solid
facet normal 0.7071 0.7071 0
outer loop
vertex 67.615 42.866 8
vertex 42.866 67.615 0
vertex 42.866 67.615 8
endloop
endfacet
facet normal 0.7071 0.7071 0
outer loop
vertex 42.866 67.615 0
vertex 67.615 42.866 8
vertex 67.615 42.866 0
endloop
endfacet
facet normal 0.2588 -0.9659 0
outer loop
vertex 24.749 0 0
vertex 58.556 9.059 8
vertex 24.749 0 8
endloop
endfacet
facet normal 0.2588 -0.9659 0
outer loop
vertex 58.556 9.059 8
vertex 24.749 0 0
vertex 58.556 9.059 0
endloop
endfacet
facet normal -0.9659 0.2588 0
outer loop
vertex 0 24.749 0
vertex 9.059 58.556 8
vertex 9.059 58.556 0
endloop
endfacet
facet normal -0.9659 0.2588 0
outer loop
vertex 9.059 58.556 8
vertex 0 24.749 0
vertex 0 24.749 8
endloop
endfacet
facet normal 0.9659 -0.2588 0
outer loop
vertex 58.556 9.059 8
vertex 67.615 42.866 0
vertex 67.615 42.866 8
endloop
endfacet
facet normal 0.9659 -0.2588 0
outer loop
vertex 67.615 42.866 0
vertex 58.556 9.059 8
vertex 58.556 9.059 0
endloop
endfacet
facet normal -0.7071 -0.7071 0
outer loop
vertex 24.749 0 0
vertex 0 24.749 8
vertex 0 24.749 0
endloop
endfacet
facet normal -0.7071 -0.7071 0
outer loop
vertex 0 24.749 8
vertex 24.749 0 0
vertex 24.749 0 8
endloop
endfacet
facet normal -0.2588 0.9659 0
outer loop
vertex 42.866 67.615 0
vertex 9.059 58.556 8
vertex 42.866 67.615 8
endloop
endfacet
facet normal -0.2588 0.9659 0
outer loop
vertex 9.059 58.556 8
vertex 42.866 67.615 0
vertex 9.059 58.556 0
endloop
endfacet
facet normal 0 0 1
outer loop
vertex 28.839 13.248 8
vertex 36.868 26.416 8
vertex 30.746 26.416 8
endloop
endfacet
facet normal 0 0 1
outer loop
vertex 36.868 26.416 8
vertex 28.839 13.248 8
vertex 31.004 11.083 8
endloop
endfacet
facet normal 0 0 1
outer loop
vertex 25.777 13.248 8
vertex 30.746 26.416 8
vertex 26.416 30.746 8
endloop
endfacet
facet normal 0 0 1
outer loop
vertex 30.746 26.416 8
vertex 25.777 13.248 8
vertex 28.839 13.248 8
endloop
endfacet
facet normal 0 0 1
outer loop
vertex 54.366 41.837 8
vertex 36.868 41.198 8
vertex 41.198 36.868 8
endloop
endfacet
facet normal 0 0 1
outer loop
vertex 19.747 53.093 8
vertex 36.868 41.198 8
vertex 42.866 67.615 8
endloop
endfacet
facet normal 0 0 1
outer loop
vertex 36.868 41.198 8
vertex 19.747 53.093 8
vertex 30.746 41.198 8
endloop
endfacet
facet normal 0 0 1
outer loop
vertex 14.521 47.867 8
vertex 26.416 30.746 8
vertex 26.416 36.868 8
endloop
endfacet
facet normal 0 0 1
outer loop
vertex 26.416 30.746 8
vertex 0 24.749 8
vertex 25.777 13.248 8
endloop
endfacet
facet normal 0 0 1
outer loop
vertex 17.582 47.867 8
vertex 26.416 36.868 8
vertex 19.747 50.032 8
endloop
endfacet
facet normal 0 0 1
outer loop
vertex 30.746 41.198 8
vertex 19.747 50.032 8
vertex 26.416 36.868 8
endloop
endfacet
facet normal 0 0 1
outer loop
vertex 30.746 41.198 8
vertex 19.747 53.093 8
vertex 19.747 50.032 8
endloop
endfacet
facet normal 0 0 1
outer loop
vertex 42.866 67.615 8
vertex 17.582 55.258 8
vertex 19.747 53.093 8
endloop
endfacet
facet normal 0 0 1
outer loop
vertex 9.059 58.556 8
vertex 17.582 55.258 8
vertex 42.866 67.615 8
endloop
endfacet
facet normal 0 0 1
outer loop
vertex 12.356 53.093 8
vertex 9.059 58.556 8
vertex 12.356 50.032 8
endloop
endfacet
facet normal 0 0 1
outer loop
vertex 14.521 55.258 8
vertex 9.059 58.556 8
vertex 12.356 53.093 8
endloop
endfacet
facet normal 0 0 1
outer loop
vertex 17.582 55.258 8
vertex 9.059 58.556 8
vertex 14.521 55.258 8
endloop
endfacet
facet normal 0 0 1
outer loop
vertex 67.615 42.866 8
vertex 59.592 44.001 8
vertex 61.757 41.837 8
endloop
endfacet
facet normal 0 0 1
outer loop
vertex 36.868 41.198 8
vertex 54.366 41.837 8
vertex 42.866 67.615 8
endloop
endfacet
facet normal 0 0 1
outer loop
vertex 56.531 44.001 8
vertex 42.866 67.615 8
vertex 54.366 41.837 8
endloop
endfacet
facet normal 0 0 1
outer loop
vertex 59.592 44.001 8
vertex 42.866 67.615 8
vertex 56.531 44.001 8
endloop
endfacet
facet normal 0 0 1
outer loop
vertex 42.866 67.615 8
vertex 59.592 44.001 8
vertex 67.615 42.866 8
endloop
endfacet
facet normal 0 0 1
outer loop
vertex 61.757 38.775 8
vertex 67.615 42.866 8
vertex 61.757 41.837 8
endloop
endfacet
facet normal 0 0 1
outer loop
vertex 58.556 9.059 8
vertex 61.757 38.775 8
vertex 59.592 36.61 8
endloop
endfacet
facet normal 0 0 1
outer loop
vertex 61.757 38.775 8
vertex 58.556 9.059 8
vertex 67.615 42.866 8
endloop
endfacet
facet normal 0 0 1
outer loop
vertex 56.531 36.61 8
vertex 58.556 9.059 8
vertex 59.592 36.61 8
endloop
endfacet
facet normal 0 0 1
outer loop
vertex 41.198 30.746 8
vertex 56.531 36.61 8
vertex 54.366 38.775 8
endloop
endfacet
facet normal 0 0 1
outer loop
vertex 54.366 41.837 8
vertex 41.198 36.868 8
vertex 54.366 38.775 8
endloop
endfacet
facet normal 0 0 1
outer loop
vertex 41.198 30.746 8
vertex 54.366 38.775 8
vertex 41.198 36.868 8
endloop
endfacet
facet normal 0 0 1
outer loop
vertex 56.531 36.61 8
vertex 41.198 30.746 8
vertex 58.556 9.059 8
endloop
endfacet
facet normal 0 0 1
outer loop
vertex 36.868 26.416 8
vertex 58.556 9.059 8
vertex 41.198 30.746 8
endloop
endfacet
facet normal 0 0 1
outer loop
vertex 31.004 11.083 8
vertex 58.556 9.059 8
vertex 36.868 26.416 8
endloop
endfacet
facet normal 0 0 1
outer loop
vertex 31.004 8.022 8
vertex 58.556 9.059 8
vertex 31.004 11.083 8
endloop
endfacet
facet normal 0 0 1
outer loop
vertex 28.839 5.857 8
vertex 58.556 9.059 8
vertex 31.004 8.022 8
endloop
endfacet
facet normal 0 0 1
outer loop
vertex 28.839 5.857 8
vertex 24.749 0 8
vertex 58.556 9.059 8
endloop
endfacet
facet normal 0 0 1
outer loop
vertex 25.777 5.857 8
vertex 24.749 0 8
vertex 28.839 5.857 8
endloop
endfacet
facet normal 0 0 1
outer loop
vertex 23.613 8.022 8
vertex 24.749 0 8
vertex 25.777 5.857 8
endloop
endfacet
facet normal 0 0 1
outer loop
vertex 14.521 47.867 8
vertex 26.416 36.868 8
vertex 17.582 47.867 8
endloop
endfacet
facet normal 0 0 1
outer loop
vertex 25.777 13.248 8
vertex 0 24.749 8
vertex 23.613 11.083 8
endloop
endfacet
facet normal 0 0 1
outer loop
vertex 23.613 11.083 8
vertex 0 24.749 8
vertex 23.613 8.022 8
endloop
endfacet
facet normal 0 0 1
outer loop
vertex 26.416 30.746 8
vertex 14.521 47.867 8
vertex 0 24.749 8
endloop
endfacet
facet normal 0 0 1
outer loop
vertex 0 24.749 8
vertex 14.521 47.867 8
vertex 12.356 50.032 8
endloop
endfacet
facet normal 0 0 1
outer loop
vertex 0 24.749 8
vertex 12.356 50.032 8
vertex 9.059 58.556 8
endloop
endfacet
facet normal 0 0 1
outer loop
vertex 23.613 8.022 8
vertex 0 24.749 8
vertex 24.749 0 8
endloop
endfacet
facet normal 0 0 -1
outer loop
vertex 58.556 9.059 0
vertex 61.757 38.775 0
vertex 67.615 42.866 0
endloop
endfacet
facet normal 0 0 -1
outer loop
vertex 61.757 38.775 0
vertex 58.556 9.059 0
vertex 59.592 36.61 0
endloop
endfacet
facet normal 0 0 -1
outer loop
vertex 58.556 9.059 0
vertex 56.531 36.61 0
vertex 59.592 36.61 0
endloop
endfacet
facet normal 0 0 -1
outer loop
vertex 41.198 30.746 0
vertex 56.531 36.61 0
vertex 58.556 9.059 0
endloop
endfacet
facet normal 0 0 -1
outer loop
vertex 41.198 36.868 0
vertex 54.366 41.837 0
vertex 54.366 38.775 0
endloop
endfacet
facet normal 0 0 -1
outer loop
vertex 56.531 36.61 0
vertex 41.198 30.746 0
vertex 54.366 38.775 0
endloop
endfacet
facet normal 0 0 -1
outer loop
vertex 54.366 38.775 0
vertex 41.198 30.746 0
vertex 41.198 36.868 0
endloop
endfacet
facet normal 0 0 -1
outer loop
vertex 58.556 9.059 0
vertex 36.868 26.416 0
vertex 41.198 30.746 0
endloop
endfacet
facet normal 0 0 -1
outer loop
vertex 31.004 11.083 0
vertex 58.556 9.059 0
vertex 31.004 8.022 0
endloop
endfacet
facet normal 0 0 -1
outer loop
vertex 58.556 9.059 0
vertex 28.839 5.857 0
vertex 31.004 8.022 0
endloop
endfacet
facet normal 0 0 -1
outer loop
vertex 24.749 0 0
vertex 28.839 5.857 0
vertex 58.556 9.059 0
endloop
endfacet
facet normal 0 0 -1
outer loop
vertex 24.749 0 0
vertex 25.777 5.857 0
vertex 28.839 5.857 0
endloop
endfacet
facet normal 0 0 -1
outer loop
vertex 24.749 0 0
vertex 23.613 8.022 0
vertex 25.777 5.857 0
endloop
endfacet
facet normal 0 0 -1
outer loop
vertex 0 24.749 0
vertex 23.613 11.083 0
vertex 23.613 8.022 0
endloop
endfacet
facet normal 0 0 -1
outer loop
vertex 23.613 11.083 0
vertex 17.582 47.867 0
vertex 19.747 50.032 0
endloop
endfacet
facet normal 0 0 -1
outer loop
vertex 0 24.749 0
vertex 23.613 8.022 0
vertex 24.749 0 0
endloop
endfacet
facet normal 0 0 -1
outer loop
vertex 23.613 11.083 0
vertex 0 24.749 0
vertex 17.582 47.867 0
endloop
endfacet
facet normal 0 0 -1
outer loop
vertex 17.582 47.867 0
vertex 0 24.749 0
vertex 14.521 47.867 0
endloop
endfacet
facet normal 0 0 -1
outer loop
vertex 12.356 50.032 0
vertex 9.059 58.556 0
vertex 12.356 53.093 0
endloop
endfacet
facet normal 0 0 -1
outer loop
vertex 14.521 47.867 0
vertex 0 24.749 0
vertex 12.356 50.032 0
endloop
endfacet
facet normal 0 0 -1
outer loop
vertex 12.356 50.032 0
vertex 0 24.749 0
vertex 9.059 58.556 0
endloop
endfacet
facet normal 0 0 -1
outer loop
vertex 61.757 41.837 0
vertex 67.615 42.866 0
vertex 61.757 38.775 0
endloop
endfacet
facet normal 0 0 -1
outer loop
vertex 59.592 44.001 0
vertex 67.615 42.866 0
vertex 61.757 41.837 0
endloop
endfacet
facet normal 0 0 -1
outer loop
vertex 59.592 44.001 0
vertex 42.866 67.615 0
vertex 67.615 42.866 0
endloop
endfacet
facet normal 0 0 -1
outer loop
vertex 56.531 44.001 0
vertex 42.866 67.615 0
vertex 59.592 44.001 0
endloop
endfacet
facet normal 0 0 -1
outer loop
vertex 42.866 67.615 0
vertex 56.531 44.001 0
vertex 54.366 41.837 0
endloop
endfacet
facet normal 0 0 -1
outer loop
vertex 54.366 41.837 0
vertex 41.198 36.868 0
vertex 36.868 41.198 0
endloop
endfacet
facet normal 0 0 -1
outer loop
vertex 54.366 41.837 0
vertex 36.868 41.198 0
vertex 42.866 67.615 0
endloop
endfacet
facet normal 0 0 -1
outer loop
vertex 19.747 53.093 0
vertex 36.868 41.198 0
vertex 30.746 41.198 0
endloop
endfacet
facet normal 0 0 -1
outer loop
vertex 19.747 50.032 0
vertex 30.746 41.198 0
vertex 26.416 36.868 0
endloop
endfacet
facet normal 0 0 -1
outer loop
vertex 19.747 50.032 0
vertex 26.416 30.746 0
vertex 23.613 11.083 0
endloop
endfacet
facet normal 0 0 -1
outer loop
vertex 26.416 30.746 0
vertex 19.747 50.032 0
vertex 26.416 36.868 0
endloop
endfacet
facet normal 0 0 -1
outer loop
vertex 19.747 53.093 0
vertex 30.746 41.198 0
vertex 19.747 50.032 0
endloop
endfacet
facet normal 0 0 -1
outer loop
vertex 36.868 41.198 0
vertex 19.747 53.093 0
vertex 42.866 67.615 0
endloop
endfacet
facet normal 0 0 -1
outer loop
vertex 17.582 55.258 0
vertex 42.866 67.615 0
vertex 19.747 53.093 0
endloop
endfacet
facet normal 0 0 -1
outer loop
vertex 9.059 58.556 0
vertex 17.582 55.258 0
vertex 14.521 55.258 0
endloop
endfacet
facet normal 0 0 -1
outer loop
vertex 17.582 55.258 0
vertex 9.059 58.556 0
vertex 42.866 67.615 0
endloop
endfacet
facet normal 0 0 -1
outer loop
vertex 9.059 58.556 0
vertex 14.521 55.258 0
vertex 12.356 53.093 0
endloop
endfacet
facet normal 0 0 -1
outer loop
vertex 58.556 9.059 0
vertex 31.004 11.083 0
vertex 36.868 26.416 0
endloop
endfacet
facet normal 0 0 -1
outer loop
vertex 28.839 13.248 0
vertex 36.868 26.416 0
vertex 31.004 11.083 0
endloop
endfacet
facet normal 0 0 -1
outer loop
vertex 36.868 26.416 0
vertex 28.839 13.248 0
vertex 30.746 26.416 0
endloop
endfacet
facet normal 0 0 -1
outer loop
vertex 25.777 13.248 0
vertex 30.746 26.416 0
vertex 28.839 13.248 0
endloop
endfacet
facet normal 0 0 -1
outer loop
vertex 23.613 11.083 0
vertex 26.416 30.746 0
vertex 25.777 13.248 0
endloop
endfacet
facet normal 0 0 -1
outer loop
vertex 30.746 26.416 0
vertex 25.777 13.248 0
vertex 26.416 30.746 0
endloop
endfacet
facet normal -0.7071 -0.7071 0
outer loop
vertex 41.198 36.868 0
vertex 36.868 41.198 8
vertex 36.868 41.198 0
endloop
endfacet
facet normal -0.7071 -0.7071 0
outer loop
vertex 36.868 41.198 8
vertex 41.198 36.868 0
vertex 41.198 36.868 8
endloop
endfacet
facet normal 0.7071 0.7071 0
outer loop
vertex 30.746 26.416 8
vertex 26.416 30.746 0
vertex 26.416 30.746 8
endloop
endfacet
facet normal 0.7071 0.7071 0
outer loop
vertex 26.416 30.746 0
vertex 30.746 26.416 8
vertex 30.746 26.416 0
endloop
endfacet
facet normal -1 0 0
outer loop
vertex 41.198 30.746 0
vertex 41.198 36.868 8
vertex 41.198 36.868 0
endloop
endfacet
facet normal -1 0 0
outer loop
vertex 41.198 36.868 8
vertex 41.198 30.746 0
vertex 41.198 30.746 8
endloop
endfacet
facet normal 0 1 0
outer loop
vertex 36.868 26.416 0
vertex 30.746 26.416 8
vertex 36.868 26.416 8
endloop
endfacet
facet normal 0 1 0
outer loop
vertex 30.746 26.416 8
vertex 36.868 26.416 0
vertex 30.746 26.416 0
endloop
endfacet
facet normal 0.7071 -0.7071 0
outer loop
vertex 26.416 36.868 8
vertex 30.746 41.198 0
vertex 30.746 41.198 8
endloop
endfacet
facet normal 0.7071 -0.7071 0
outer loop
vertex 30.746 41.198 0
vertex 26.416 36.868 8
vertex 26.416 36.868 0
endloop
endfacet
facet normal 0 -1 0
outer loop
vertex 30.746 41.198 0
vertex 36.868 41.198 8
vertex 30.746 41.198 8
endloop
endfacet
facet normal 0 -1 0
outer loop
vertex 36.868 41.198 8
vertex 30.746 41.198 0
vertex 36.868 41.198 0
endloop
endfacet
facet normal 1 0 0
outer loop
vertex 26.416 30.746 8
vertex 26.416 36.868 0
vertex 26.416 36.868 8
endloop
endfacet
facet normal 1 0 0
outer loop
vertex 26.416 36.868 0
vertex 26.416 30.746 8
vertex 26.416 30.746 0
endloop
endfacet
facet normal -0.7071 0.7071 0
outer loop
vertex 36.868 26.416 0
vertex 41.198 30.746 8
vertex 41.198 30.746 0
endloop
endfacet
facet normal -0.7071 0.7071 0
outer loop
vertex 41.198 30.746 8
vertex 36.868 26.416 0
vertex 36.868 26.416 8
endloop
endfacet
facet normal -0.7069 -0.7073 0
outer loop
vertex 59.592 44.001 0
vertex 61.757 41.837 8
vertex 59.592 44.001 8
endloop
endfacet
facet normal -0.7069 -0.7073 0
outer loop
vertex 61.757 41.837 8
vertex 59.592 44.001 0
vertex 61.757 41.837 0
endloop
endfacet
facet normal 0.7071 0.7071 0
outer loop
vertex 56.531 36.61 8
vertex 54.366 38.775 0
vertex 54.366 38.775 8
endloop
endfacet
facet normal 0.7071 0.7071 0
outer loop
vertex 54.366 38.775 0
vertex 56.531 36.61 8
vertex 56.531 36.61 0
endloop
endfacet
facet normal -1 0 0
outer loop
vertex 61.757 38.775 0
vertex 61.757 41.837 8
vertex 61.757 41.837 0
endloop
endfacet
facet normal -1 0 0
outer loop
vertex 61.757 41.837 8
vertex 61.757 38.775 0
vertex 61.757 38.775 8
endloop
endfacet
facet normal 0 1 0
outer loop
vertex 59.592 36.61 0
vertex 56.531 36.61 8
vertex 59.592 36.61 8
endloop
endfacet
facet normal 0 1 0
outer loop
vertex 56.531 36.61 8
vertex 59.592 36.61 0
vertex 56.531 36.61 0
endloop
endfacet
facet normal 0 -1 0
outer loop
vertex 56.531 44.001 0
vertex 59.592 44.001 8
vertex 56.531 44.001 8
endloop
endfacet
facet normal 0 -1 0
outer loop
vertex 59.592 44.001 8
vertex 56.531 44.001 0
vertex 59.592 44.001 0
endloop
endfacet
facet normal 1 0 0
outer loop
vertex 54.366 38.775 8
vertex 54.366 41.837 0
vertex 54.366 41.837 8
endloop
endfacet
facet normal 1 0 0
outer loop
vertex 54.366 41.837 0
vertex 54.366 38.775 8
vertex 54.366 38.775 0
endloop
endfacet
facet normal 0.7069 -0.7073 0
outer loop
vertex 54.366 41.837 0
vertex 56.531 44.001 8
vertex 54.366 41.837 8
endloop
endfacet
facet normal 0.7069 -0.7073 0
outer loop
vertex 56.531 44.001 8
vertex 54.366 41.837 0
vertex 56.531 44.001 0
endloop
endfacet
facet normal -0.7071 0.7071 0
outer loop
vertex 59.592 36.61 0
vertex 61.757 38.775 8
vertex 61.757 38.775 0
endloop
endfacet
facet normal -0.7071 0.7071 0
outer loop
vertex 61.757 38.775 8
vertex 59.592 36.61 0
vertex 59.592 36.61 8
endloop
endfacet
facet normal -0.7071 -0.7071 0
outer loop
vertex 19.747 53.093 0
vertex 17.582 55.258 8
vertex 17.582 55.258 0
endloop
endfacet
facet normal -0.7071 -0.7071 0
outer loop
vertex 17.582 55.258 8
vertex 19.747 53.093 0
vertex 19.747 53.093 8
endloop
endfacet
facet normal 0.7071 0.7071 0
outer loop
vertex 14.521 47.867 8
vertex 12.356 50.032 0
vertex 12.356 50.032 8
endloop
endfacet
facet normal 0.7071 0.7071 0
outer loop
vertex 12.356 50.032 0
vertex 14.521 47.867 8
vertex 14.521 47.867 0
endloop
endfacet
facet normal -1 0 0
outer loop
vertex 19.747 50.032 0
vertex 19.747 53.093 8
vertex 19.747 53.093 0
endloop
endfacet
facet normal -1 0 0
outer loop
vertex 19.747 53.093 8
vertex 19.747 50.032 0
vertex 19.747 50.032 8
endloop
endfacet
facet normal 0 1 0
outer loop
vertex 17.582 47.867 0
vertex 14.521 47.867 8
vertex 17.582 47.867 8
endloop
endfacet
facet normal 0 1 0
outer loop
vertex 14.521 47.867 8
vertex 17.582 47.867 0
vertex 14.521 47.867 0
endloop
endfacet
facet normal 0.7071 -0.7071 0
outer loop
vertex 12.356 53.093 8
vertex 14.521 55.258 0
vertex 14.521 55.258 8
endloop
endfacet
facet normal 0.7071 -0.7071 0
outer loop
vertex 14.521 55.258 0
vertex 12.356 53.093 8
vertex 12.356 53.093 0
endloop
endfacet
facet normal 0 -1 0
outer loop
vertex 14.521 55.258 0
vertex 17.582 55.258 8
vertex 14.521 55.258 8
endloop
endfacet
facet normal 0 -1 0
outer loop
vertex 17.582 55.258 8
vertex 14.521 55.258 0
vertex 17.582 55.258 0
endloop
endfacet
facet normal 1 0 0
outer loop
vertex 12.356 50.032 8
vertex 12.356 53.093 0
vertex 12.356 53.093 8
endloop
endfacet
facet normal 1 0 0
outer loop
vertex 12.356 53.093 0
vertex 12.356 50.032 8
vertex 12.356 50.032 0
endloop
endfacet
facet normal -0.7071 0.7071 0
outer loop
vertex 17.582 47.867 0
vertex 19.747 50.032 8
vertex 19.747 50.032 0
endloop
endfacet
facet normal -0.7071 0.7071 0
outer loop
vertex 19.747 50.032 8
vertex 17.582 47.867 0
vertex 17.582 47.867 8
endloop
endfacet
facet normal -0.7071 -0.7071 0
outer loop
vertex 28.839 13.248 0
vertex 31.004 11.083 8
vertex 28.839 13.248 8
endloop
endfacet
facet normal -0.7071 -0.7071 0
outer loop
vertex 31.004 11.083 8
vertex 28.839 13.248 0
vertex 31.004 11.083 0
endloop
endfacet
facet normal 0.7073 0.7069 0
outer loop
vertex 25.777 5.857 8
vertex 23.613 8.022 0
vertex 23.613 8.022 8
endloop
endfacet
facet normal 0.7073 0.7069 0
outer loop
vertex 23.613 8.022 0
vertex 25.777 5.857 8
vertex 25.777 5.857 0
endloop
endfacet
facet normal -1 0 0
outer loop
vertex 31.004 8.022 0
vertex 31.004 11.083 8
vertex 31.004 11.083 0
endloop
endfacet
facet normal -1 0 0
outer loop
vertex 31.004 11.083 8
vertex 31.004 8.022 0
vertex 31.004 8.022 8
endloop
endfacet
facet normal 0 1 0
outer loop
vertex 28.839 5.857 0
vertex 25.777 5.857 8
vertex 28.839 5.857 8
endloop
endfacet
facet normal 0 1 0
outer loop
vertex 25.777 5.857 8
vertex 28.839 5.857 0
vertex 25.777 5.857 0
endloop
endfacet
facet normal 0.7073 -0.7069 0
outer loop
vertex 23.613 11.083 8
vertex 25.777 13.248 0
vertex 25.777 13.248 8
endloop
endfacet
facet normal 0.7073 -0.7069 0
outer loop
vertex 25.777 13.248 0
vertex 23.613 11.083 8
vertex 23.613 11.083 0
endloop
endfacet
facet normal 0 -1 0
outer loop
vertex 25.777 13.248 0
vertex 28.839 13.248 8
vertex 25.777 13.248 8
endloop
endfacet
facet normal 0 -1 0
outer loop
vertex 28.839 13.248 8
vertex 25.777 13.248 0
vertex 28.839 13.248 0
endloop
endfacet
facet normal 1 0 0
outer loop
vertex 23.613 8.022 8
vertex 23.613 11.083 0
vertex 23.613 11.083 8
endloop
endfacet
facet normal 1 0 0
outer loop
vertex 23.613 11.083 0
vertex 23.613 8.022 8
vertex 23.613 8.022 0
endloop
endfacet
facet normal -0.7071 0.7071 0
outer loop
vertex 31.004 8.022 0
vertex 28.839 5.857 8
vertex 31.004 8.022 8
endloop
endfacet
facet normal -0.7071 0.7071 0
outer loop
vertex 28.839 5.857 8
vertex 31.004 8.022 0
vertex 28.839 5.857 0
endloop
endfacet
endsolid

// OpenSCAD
$fn = 32;

// ----------------------------------------------------------------------
// Polygon plate: 6-gon R35, 3 bolt windows
// ----------------------------------------------------------------------

// --- parameters (mm) ---
sides = 6;                // number of polygon sides
plate_r = 35;             // circumscribed radius of the polygon
bore_r = 8;               // centre bore radius
bolts = 3;                // number of bolt windows
ring_r = 25.11;           // bolt-circle radius
bolt_r = 4;               // bolt window radius
plate_t = 8;              // plate thickness, Z (extrusion height)

plate_d = 2 * plate_r;  // circumscribed diameter
bore_d = 2 * bore_r;  // centre bore diameter
bolt_d = 2 * bolt_r;  // bolt window diameter
ring_d = 2 * ring_r;  // bolt-circle diameter

profile = [[67.615, 42.866], [42.866, 67.615], [9.059, 58.556], [0, 24.749], [24.749, 0], [58.556, 9.059]];  // primary outline, 6 points, counter clockwise
void_1 = [[41.198, 36.868], [36.868, 41.198], [30.746, 41.198], [26.416, 36.868], [26.416, 30.746], [30.746, 26.416], [36.868, 26.416], [41.198, 30.746]];  // centre bore, 8 points
void_2 = [[61.757, 41.837], [59.592, 44.001], [56.531, 44.001], [54.366, 41.837], [54.366, 38.775], [56.531, 36.61], [59.592, 36.61], [61.757, 38.775]];  // bolt window 1, 8 points
void_3 = [[19.747, 53.093], [17.582, 55.258], [14.521, 55.258], [12.356, 53.093], [12.356, 50.032], [14.521, 47.867], [17.582, 47.867], [19.747, 50.032]];  // bolt window 2, 8 points
void_4 = [[31.004, 11.083], [28.839, 13.248], [25.777, 13.248], [23.613, 11.083], [23.613, 8.022], [25.777, 5.857], [28.839, 5.857], [31.004, 8.022]];  // bolt window 3, 8 points

// --- the one profile operation ---
difference() {
  linear_extrude(height = plate_t) polygon(points = profile);
  translate([0, 0, -1])
    linear_extrude(height = plate_t + 2) polygon(points = void_1);
  translate([0, 0, -1])
    linear_extrude(height = plate_t + 2) polygon(points = void_2);
  translate([0, 0, -1])
    linear_extrude(height = plate_t + 2) polygon(points = void_3);
  translate([0, 0, -1])
    linear_extrude(height = plate_t + 2) polygon(points = void_4);
}
